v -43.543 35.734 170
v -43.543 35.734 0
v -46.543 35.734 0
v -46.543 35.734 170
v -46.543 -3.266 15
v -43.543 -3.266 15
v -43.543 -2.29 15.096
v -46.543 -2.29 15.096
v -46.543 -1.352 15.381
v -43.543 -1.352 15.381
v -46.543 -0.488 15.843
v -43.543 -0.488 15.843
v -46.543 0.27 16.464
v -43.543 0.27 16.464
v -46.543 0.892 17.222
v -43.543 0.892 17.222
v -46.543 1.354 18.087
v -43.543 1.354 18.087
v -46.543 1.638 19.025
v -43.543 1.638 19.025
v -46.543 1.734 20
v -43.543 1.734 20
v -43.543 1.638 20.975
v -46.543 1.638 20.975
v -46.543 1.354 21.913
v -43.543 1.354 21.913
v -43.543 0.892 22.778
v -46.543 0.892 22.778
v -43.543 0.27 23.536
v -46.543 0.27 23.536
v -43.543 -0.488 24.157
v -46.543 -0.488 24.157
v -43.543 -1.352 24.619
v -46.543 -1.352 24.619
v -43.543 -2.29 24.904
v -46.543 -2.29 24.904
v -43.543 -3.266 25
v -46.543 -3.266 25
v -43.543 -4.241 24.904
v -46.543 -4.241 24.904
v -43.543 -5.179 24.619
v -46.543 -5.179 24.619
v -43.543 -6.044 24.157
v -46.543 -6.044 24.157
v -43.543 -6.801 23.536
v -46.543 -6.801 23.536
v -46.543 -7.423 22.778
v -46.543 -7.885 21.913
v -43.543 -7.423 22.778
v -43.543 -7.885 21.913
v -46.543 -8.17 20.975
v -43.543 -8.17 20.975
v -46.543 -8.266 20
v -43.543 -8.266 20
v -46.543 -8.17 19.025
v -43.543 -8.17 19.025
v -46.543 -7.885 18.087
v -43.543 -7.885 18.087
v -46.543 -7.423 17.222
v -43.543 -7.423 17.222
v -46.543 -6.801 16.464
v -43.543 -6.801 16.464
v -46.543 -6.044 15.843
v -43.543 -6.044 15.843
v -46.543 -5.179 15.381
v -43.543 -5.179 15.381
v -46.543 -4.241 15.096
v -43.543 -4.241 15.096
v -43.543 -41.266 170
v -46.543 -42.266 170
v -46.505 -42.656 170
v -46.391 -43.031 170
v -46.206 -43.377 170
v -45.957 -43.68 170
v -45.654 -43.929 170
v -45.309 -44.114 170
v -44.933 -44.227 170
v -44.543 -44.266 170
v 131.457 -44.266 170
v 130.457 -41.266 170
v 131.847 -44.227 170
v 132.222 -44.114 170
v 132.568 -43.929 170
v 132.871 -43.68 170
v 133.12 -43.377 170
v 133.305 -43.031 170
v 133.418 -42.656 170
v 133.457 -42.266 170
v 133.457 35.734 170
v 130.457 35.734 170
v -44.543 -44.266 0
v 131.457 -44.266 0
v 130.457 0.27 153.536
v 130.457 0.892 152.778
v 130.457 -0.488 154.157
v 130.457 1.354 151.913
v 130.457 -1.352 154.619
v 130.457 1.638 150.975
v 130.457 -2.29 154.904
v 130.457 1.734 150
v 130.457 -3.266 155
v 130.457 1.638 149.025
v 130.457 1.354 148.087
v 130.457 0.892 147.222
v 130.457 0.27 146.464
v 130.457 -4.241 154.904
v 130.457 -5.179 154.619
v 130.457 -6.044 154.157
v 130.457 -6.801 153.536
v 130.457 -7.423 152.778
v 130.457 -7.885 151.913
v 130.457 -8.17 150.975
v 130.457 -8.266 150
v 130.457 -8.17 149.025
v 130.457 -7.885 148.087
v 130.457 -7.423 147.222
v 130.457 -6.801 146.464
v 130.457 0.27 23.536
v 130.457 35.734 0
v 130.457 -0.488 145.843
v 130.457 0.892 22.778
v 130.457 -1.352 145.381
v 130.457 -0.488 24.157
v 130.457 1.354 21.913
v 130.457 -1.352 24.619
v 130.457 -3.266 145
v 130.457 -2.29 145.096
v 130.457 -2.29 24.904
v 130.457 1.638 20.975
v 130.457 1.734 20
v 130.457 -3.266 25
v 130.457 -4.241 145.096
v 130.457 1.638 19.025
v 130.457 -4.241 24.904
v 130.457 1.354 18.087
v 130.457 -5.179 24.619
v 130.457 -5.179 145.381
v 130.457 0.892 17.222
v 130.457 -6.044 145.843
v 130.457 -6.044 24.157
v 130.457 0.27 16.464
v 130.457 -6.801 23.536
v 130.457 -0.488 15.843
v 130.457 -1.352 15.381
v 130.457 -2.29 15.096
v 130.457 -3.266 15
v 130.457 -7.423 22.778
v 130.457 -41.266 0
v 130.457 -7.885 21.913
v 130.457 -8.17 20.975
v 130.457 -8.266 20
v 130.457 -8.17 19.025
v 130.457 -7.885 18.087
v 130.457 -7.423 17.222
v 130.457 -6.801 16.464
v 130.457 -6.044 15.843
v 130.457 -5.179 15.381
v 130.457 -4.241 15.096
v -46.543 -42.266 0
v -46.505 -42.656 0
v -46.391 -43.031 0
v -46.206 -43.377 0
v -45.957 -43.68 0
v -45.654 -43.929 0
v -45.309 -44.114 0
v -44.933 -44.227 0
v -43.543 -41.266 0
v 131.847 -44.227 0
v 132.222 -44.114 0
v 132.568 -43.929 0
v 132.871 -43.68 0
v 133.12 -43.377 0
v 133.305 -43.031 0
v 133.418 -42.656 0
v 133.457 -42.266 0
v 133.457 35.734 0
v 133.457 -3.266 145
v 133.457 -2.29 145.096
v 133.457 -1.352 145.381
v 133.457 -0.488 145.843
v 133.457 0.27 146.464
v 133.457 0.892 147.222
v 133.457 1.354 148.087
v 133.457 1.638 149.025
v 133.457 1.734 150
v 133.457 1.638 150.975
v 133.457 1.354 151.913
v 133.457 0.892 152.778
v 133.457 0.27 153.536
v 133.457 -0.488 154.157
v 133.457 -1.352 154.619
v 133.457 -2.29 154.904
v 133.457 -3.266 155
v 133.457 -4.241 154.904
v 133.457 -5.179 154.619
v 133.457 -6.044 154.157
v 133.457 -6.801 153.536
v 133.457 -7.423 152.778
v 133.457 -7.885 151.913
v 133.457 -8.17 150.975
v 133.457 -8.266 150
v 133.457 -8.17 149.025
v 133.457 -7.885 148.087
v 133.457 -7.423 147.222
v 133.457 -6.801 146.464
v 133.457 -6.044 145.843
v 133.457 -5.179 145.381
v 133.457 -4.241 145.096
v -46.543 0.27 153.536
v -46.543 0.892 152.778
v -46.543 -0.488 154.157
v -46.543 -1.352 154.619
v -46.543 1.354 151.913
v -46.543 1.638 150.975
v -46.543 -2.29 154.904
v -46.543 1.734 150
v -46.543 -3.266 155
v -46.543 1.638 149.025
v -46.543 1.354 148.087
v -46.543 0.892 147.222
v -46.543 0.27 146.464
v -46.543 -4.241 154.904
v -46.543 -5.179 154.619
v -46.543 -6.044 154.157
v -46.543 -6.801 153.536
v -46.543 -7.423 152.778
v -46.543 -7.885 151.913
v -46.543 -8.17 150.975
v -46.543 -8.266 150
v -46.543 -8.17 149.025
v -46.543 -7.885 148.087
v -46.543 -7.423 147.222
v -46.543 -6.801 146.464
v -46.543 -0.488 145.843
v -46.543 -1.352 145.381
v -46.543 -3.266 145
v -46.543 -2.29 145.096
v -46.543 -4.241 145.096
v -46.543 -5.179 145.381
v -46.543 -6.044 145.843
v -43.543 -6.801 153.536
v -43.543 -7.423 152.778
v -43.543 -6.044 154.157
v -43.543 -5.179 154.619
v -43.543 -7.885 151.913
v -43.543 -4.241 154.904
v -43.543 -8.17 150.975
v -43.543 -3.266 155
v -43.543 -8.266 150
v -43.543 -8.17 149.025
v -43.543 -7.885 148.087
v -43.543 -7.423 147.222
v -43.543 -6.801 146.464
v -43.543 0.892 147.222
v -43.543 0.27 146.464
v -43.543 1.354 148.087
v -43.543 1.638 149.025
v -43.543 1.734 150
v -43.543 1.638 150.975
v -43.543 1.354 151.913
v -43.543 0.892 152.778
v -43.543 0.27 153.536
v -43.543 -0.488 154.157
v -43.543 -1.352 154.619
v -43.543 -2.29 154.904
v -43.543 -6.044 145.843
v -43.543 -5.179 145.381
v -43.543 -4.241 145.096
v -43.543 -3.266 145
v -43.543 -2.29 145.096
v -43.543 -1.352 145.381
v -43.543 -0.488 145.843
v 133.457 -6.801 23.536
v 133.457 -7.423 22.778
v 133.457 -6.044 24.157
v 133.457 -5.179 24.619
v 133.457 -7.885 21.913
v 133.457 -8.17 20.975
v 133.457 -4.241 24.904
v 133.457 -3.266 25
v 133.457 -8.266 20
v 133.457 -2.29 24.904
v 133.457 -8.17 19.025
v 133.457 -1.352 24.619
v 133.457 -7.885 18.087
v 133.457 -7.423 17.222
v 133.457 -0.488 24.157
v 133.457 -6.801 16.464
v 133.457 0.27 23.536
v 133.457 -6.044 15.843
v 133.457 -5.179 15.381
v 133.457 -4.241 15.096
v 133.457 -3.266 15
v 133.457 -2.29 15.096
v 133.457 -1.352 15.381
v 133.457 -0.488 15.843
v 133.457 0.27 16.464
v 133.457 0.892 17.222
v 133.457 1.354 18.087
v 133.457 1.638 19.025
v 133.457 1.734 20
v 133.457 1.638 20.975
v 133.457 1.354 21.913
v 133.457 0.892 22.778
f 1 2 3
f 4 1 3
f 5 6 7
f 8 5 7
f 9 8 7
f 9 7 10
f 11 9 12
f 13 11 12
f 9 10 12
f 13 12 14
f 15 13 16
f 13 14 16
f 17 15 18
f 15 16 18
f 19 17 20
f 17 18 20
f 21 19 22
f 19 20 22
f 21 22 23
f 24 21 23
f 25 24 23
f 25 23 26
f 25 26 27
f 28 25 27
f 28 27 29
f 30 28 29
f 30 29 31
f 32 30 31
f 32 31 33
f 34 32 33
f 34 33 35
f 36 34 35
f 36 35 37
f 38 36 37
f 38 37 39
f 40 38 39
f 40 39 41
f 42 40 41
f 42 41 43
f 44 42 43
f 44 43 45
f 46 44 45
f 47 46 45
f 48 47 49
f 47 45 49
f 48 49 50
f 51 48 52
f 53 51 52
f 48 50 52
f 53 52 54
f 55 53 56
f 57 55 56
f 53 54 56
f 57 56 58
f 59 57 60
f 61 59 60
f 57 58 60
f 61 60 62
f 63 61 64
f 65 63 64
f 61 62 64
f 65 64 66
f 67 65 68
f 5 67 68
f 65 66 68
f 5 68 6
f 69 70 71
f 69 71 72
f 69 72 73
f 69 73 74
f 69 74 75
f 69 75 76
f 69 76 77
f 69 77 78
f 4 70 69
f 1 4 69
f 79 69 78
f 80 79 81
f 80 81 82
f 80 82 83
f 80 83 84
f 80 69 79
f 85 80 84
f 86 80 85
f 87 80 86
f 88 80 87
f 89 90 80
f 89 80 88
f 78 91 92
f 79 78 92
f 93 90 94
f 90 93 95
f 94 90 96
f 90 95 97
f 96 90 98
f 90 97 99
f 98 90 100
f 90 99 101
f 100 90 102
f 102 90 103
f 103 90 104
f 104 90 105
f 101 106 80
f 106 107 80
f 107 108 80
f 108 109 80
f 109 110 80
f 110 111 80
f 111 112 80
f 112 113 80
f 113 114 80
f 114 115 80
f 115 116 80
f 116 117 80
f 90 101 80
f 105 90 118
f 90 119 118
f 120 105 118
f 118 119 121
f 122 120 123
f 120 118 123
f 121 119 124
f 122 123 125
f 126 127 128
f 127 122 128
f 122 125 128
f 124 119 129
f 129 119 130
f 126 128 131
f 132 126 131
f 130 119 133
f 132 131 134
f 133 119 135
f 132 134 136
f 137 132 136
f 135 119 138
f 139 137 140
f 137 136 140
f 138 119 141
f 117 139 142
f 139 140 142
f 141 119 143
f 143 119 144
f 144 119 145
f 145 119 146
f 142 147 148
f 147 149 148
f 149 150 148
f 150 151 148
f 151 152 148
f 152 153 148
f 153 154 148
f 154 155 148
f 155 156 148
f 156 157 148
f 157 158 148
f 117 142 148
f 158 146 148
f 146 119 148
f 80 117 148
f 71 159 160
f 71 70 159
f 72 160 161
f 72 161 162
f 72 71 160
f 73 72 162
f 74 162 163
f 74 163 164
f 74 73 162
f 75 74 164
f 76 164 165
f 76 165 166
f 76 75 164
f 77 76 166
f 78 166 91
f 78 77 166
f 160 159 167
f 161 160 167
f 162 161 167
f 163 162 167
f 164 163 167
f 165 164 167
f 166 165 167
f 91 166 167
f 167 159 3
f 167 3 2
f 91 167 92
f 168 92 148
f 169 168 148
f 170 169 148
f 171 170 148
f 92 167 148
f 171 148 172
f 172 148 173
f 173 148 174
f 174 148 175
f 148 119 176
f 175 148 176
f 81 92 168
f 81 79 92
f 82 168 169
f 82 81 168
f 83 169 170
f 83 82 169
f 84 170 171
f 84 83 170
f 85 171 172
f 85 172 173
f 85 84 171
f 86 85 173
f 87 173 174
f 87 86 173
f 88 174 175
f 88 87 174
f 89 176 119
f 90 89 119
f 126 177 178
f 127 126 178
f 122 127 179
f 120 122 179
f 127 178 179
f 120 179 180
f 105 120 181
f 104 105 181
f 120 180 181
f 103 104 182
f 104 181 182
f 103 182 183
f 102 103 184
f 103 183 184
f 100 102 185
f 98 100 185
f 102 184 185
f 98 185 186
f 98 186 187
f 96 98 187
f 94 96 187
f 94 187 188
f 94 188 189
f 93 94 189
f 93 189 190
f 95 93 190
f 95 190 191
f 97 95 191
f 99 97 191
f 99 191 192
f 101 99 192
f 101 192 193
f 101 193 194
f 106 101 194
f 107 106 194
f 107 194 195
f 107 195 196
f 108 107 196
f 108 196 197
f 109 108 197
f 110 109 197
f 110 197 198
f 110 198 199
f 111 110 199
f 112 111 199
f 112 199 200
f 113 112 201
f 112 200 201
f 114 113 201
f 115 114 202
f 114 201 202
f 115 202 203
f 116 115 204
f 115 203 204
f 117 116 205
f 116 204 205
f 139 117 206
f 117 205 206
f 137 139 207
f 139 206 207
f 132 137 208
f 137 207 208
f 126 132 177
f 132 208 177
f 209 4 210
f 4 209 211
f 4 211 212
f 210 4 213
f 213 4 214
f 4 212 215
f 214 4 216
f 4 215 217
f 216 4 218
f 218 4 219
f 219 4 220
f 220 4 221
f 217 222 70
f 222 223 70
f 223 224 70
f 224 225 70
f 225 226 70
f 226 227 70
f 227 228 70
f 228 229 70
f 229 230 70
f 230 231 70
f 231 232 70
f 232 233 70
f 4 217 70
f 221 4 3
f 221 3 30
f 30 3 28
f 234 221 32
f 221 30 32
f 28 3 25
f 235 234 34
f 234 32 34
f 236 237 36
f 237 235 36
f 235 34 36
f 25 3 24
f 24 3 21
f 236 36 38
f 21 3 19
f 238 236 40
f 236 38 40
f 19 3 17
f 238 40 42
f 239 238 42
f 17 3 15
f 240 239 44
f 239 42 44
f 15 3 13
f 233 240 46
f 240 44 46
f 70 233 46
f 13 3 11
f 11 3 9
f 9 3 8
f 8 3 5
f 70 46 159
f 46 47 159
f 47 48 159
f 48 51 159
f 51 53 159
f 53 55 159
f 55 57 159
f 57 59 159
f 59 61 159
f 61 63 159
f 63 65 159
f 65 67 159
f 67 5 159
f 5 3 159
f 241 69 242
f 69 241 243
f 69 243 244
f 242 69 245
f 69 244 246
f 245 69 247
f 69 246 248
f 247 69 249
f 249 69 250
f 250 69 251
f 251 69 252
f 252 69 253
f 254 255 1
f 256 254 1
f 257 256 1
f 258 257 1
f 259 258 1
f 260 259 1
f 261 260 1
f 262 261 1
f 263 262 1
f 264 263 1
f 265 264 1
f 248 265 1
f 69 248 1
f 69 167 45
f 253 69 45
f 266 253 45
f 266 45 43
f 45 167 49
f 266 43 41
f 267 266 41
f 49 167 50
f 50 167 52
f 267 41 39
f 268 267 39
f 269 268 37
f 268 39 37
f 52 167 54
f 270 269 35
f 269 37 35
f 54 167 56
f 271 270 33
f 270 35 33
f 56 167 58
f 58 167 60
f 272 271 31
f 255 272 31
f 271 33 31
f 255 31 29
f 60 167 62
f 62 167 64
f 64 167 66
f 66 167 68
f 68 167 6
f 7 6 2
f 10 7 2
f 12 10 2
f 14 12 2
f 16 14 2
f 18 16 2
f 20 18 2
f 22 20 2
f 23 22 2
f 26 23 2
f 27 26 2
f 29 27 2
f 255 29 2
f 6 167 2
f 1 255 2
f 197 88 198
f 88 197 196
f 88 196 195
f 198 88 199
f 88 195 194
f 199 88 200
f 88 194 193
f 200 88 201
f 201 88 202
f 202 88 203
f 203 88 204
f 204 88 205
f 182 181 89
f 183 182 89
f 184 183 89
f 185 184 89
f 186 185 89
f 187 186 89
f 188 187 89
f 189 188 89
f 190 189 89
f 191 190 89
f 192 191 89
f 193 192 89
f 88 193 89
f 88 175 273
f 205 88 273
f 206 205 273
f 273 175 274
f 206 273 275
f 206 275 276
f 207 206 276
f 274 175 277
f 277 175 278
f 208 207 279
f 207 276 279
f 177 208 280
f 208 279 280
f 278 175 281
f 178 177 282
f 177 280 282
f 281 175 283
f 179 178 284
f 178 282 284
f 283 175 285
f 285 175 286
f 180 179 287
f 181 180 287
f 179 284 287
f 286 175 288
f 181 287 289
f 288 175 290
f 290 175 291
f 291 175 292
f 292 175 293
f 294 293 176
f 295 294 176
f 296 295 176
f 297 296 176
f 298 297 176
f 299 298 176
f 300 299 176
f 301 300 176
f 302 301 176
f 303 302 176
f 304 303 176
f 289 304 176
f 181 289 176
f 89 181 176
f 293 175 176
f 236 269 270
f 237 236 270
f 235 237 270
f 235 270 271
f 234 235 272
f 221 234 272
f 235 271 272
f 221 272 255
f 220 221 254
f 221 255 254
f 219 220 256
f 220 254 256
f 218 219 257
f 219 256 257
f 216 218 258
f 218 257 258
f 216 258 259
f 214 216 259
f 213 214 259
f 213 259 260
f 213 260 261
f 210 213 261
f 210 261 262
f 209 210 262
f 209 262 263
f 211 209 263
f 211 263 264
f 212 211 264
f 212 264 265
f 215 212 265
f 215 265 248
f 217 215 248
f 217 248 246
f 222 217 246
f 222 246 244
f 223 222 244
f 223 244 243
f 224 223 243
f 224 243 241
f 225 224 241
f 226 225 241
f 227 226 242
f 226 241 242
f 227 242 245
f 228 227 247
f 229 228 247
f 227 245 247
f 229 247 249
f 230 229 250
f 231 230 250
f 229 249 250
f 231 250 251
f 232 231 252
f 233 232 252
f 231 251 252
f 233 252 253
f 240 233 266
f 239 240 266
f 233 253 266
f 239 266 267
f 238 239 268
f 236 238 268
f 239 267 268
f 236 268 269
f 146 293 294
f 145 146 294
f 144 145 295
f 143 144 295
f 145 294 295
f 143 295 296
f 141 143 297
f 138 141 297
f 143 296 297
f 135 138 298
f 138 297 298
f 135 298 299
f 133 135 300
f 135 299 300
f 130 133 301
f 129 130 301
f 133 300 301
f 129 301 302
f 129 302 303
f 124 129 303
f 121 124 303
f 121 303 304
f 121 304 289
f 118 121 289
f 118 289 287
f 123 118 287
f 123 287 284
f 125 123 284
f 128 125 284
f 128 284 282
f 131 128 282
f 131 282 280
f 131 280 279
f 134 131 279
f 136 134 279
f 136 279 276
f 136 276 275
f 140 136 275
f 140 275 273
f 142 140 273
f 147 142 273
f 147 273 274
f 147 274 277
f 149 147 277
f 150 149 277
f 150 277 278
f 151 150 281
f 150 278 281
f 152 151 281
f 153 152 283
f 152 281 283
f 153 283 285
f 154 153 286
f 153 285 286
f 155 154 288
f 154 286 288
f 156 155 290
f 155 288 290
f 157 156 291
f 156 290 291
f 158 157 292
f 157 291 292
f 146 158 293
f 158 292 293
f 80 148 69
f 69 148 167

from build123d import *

# Parameters (mm, degrees)
BOSS_EXTRUDE1_DEPTH = 170
FILLET1_R           = 2
FILLET2_R           = 2
SKETCH2_R           = 5
CUT_EXTRUDE2_DEPTH  = 455


with BuildPart() as part:
    # Sketch1 → Boss-Extrude1 (new body)
    with BuildSketch(Plane.XY):
        Polygon((-43.543195893, -41.265832091), (-43.543195893, 35.734167909), (-46.543195893, 35.734167909), (-46.543195893, -44.265832091), (133.456804107, -44.265832091), (133.456804107, 35.734167909), (130.456804107, 35.734167909), (130.456804107, -41.265832091), align=None)
    extrude(amount=BOSS_EXTRUDE1_DEPTH)

    # Fillet1
    fillet1_edges = [part.edges().sort_by_distance(p)[0] for p in [
        (-46.543195893, -44.265832091, 85),
    ]]
    fillet(fillet1_edges, radius=FILLET1_R)

    # Fillet2
    fillet2_edges = [part.edges().sort_by_distance(p)[0] for p in [
        (133.456804107, -44.265832091, 85),
    ]]
    fillet(fillet2_edges, radius=FILLET2_R)

    # Sketch2 → Cut-Extrude2 (cut)
    with BuildSketch(Plane(origin=(133.456804107, 0, 0), x_dir=(0, 0, -1), z_dir=(1, 0, 0))):
        with Locations((-150, -3.265832091)):
            Circle(SKETCH2_R)
        with Locations((-20, -3.265832091)):
            Circle(SKETCH2_R)
    extrude(amount=-CUT_EXTRUDE2_DEPTH, mode=Mode.SUBTRACT)


solid = part.part
